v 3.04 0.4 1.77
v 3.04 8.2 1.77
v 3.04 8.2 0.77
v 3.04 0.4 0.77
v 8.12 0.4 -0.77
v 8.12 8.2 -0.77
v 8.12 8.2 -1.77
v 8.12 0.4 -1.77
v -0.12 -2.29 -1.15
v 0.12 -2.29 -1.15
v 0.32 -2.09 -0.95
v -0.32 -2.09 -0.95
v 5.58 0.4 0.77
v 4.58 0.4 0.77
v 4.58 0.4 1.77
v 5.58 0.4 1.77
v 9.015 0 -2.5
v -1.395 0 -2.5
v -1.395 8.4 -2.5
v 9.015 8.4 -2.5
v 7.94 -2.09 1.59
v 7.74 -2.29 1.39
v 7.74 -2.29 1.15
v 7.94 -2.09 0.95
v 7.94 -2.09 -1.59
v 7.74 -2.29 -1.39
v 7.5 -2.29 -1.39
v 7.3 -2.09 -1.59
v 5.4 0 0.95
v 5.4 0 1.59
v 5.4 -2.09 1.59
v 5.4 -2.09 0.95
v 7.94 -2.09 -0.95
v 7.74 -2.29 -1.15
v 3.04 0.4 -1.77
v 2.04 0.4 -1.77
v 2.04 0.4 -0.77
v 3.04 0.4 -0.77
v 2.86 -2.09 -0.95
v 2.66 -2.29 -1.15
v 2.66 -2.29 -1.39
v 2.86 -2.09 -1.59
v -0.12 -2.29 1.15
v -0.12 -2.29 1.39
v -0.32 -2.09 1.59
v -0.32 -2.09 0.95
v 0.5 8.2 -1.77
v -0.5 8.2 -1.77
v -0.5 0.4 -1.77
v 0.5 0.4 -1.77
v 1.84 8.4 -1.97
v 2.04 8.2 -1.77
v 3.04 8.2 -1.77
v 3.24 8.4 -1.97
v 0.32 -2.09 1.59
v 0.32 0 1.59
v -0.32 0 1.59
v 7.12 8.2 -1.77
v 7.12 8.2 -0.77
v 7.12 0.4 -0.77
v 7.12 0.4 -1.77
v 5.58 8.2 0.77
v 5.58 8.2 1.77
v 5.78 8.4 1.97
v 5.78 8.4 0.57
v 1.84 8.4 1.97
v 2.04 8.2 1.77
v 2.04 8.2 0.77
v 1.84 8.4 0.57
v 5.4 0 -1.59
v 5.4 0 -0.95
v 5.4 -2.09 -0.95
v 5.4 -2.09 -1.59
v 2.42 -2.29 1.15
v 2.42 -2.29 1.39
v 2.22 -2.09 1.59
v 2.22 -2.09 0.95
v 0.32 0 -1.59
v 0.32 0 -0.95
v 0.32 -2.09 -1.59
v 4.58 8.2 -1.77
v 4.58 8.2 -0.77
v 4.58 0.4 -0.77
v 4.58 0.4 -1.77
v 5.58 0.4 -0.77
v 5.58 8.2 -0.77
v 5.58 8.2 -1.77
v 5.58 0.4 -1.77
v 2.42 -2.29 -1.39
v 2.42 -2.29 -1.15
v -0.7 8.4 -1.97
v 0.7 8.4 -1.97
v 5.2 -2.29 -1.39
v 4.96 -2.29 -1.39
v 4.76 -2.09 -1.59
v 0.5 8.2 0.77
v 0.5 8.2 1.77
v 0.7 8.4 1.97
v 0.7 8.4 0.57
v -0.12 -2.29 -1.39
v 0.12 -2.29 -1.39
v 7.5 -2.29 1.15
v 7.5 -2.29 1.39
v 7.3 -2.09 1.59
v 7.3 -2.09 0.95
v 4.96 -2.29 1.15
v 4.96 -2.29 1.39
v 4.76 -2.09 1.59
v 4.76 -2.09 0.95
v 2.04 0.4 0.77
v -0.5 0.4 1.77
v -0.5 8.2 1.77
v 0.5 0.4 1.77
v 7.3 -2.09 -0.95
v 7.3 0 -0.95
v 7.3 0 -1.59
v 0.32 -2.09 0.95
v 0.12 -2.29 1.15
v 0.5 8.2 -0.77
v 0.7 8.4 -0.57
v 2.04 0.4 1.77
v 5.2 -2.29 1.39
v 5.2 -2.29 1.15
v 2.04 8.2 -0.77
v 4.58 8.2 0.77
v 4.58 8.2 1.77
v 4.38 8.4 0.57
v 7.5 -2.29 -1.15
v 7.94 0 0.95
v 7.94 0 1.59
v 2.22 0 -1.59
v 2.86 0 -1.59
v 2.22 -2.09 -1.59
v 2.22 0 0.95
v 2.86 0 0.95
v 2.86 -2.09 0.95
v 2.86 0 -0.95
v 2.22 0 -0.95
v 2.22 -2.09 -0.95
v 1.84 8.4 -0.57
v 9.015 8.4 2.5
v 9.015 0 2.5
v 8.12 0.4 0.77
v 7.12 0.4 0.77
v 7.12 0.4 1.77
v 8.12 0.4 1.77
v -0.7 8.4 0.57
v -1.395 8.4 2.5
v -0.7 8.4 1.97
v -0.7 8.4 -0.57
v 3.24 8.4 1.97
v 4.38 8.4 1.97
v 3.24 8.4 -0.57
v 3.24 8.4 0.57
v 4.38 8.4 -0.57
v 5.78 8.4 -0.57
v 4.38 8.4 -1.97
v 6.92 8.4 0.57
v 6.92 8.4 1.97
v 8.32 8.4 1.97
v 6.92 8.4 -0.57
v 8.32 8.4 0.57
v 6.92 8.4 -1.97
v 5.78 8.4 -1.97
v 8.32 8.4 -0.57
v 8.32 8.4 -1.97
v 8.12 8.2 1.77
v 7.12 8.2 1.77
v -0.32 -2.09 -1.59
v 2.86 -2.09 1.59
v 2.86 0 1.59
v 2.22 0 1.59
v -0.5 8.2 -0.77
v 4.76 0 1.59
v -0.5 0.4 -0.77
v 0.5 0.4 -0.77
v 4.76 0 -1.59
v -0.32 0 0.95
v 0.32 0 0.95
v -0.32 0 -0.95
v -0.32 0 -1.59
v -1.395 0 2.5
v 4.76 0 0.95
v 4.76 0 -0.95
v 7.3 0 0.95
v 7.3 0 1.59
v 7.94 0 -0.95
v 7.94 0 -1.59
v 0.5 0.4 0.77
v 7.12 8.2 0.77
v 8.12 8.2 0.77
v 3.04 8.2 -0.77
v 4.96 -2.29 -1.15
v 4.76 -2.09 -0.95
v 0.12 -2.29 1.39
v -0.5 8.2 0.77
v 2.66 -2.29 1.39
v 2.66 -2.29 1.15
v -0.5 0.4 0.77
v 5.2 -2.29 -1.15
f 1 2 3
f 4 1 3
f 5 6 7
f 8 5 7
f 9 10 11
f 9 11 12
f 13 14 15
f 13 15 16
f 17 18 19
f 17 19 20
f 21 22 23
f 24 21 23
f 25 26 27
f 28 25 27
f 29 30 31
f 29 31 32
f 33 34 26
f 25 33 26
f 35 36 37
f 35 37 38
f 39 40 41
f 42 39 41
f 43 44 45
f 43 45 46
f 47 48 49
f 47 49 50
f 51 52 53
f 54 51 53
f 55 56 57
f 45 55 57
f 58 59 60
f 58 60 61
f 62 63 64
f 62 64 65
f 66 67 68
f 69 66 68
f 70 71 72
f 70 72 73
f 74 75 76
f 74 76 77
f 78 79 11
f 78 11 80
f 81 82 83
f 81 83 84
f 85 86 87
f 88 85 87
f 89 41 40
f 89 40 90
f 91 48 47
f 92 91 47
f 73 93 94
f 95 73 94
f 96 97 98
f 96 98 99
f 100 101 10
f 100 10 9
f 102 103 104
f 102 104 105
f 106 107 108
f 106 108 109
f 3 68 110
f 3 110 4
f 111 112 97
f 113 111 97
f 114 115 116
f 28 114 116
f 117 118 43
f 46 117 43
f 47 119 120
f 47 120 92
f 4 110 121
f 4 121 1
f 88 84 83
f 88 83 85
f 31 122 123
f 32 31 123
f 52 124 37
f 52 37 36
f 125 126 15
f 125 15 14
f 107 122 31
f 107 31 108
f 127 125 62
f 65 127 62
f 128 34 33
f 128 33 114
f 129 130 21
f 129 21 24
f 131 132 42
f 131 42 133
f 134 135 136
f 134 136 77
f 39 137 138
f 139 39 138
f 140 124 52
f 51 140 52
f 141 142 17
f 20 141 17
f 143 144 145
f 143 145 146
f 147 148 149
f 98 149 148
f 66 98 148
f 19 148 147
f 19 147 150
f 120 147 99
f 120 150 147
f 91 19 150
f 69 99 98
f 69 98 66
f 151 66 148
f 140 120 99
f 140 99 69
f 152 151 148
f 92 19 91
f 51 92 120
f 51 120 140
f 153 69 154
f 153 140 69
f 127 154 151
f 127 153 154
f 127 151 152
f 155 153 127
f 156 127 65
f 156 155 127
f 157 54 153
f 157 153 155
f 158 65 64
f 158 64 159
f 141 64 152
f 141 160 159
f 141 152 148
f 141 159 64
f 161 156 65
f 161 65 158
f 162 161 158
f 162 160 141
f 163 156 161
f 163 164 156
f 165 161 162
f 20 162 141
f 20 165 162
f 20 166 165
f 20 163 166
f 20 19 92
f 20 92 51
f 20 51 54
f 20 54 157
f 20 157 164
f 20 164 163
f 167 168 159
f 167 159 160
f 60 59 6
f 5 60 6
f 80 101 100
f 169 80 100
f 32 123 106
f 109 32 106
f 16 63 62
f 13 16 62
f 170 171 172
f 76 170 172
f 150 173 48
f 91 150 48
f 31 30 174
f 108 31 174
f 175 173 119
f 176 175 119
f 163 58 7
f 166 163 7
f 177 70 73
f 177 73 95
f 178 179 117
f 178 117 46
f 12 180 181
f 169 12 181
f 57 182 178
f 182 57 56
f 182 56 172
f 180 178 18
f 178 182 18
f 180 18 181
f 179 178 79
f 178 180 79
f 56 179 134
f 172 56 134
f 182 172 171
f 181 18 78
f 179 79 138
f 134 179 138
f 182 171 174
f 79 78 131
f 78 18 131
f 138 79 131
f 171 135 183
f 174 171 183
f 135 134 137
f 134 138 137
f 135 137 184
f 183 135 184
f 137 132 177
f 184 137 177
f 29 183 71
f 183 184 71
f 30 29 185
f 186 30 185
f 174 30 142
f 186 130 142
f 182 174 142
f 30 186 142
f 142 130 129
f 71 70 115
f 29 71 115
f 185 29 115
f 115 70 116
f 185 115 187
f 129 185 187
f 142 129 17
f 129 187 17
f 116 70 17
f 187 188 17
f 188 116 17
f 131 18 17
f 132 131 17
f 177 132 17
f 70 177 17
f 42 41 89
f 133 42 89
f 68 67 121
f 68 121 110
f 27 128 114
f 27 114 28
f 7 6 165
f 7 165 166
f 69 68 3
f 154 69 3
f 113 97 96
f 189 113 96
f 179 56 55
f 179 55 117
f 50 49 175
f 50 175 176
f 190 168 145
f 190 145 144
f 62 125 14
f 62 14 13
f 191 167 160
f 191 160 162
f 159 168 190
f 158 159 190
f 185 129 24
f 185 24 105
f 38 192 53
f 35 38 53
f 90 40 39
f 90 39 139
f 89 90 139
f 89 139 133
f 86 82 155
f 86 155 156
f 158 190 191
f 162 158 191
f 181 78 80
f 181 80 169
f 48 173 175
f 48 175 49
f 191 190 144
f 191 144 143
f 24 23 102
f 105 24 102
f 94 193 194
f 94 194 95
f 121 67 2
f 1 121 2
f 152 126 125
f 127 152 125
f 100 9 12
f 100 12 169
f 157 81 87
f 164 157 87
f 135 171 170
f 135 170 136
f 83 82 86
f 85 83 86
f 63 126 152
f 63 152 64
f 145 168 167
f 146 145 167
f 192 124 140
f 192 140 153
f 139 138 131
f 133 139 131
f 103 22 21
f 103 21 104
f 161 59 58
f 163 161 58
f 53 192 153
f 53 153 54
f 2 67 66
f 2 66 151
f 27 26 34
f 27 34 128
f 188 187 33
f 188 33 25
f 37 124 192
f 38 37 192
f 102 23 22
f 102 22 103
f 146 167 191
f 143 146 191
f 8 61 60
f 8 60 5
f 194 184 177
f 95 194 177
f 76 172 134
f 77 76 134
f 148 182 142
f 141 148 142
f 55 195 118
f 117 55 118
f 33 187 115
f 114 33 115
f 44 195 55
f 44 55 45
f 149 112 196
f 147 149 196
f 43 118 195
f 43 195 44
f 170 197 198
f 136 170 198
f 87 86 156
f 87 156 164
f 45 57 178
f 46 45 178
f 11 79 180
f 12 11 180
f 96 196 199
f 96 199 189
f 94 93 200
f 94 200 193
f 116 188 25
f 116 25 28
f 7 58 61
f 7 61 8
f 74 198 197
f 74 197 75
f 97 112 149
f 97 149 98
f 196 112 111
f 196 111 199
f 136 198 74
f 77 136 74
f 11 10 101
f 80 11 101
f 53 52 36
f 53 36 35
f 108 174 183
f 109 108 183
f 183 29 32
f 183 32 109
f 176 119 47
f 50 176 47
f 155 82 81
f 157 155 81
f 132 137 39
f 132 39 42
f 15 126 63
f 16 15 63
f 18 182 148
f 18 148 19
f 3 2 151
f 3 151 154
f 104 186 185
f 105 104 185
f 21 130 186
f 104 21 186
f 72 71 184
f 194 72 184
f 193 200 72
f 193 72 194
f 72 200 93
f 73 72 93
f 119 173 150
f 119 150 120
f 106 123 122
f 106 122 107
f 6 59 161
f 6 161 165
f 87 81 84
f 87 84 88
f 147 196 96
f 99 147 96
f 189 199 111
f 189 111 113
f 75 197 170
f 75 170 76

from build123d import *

# Parameters (mm, degrees)
SKETCH_1_W                         = 2.79
SKETCH_1_H                         = 5
EXTRUDE_1_DEPTH                    = 8.4
SKETCH_2_W                         = 1
SKETCH_2_H                         = 1
CUT_EXTRUDE_1_DEPTH                = 8
CHAMFER_1_SIZE                     = 0.2
SKETCH_3_W                         = 0.64
SKETCH_3_H                         = 0.64
EXTRUDE_2_DEPTH                    = 2.29
CHAMFER_2_SIZE                     = 0.2
PATTERN_LINEAR_1_COUNT             = 4
PATTERN_LINEAR_1_PITCH             = 2.54
CHAMFER_1_OF_PATTERN_LINEAR_1_SIZE = 0.2
CHAMFER_2_OF_PATTERN_LINEAR_1_SIZE = 0.2


with BuildPart() as part:
    # Эскиз1 → Бобышка-Вытянуть1 (new body)
    with BuildSketch(Plane(origin=(0, 0, 0), x_dir=(1, 0, 0), z_dir=(0, 1, 0))):
        Rectangle(SKETCH_1_W, SKETCH_1_H)
    extrude_1 = extrude(amount=EXTRUDE_1_DEPTH)

    # Эскиз2 → Вырез-Вытянуть1 (cut)
    with BuildSketch(Plane(origin=(0, 8.4, 0), x_dir=(1, 0, 0), z_dir=(0, 1, 0))):
        with Locations((0, 1.27)):
            Rectangle(SKETCH_2_W, SKETCH_2_H)
        with Locations((0, -1.27)):
            Rectangle(SKETCH_2_W, SKETCH_2_H)
    cut_extrude_1 = extrude(amount=-CUT_EXTRUDE_1_DEPTH, mode=Mode.SUBTRACT)

    # Фаска1
    chamfer_1_edges = [part.edges().sort_by_distance(p)[0] for p in [
        (0.5, 8.4, -1.27),
        (0, 8.4, -1.77),
        (-0.5, 8.4, -1.27),
        (0, 8.4, -0.77),
        (0, 8.4, 1.77),
        (0.5, 8.4, 1.27),
        (0, 8.4, 0.77),
        (-0.5, 8.4, 1.27),
    ]]
    chamfer(chamfer_1_edges, length=CHAMFER_1_SIZE)

    # Эскиз3 → Бобышка-Вытянуть2 (add)
    with BuildSketch(Plane(origin=(0, 0, 0), x_dir=(-1, 0, 0), z_dir=(0, -1, 0))):
        with Locations((0, 1.27)):
            Rectangle(SKETCH_3_W, SKETCH_3_H)
        with Locations((0, -1.27)):
            Rectangle(SKETCH_3_W, SKETCH_3_H)
    extrude_2 = extrude(amount=EXTRUDE_2_DEPTH)

    # Фаска2
    chamfer_2_edges = [part.edges().sort_by_distance(p)[0] for p in [
        (0.32, -2.29, -1.27),
        (0, -2.29, -0.95),
        (-0.32, -2.29, -1.27),
        (0, -2.29, -1.59),
        (-0.32, -2.29, 1.27),
        (0, -2.29, 0.95),
        (0.32, -2.29, 1.27),
        (0, -2.29, 1.59),
    ]]
    chamfer(chamfer_2_edges, length=CHAMFER_2_SIZE)

    # Линейный массив1: Бобышка-Вытянуть1, Вырез-Вытянуть1, Бобышка-Вытянуть2 ×4
    with Locations(*[(i * PATTERN_LINEAR_1_PITCH, 0, 0) for i in range(1, PATTERN_LINEAR_1_COUNT)]):
        add(extrude_1)
        add(cut_extrude_1, mode=Mode.SUBTRACT)
        add(extrude_2)

    # Фаска1 of Линейный массив1
    chamfer_1_of_pattern_linear_1_edges = [part.edges().sort_by_distance(p)[0] for p in [
        (3.04, 8.4, -1.27),
        (2.54, 8.4, -1.77),
        (2.04, 8.4, -1.27),
        (2.54, 8.4, -0.77),
        (2.54, 8.4, 1.77),
        (3.04, 8.4, 1.27),
        (2.54, 8.4, 0.77),
        (2.04, 8.4, 1.27),
        (5.58, 8.4, -1.27),
        (5.08, 8.4, -1.77),
        (4.58, 8.4, -1.27),
        (5.08, 8.4, -0.77),
        (5.08, 8.4, 1.77),
        (5.58, 8.4, 1.27),
        (5.08, 8.4, 0.77),
        (4.58, 8.4, 1.27),
        (8.12, 8.4, -1.27),
        (7.62, 8.4, -1.77),
        (7.12, 8.4, -1.27),
        (7.62, 8.4, -0.77),
        (7.62, 8.4, 1.77),
        (8.12, 8.4, 1.27),
        (7.62, 8.4, 0.77),
        (7.12, 8.4, 1.27),
    ]]
    chamfer(chamfer_1_of_pattern_linear_1_edges, length=CHAMFER_1_OF_PATTERN_LINEAR_1_SIZE)

    # Фаска2 of Линейный массив1
    chamfer_2_of_pattern_linear_1_edges = [part.edges().sort_by_distance(p)[0] for p in [
        (2.86, -2.29, -1.27),
        (2.54, -2.29, -0.95),
        (2.22, -2.29, -1.27),
        (2.54, -2.29, -1.59),
        (2.22, -2.29, 1.27),
        (2.54, -2.29, 0.95),
        (2.86, -2.29, 1.27),
        (2.54, -2.29, 1.59),
        (5.4, -2.29, -1.27),
        (5.08, -2.29, -0.95),
        (4.76, -2.29, -1.27),
        (5.08, -2.29, -1.59),
        (4.76, -2.29, 1.27),
        (5.08, -2.29, 0.95),
        (5.4, -2.29, 1.27),
        (5.08, -2.29, 1.59),
        (7.94, -2.29, -1.27),
        (7.62, -2.29, -0.95),
        (7.3, -2.29, -1.27),
        (7.62, -2.29, -1.59),
        (7.3, -2.29, 1.27),
        (7.62, -2.29, 0.95),
        (7.94, -2.29, 1.27),
        (7.62, -2.29, 1.59),
    ]]
    chamfer(chamfer_2_of_pattern_linear_1_edges, length=CHAMFER_2_OF_PATTERN_LINEAR_1_SIZE)


solid = part.part
